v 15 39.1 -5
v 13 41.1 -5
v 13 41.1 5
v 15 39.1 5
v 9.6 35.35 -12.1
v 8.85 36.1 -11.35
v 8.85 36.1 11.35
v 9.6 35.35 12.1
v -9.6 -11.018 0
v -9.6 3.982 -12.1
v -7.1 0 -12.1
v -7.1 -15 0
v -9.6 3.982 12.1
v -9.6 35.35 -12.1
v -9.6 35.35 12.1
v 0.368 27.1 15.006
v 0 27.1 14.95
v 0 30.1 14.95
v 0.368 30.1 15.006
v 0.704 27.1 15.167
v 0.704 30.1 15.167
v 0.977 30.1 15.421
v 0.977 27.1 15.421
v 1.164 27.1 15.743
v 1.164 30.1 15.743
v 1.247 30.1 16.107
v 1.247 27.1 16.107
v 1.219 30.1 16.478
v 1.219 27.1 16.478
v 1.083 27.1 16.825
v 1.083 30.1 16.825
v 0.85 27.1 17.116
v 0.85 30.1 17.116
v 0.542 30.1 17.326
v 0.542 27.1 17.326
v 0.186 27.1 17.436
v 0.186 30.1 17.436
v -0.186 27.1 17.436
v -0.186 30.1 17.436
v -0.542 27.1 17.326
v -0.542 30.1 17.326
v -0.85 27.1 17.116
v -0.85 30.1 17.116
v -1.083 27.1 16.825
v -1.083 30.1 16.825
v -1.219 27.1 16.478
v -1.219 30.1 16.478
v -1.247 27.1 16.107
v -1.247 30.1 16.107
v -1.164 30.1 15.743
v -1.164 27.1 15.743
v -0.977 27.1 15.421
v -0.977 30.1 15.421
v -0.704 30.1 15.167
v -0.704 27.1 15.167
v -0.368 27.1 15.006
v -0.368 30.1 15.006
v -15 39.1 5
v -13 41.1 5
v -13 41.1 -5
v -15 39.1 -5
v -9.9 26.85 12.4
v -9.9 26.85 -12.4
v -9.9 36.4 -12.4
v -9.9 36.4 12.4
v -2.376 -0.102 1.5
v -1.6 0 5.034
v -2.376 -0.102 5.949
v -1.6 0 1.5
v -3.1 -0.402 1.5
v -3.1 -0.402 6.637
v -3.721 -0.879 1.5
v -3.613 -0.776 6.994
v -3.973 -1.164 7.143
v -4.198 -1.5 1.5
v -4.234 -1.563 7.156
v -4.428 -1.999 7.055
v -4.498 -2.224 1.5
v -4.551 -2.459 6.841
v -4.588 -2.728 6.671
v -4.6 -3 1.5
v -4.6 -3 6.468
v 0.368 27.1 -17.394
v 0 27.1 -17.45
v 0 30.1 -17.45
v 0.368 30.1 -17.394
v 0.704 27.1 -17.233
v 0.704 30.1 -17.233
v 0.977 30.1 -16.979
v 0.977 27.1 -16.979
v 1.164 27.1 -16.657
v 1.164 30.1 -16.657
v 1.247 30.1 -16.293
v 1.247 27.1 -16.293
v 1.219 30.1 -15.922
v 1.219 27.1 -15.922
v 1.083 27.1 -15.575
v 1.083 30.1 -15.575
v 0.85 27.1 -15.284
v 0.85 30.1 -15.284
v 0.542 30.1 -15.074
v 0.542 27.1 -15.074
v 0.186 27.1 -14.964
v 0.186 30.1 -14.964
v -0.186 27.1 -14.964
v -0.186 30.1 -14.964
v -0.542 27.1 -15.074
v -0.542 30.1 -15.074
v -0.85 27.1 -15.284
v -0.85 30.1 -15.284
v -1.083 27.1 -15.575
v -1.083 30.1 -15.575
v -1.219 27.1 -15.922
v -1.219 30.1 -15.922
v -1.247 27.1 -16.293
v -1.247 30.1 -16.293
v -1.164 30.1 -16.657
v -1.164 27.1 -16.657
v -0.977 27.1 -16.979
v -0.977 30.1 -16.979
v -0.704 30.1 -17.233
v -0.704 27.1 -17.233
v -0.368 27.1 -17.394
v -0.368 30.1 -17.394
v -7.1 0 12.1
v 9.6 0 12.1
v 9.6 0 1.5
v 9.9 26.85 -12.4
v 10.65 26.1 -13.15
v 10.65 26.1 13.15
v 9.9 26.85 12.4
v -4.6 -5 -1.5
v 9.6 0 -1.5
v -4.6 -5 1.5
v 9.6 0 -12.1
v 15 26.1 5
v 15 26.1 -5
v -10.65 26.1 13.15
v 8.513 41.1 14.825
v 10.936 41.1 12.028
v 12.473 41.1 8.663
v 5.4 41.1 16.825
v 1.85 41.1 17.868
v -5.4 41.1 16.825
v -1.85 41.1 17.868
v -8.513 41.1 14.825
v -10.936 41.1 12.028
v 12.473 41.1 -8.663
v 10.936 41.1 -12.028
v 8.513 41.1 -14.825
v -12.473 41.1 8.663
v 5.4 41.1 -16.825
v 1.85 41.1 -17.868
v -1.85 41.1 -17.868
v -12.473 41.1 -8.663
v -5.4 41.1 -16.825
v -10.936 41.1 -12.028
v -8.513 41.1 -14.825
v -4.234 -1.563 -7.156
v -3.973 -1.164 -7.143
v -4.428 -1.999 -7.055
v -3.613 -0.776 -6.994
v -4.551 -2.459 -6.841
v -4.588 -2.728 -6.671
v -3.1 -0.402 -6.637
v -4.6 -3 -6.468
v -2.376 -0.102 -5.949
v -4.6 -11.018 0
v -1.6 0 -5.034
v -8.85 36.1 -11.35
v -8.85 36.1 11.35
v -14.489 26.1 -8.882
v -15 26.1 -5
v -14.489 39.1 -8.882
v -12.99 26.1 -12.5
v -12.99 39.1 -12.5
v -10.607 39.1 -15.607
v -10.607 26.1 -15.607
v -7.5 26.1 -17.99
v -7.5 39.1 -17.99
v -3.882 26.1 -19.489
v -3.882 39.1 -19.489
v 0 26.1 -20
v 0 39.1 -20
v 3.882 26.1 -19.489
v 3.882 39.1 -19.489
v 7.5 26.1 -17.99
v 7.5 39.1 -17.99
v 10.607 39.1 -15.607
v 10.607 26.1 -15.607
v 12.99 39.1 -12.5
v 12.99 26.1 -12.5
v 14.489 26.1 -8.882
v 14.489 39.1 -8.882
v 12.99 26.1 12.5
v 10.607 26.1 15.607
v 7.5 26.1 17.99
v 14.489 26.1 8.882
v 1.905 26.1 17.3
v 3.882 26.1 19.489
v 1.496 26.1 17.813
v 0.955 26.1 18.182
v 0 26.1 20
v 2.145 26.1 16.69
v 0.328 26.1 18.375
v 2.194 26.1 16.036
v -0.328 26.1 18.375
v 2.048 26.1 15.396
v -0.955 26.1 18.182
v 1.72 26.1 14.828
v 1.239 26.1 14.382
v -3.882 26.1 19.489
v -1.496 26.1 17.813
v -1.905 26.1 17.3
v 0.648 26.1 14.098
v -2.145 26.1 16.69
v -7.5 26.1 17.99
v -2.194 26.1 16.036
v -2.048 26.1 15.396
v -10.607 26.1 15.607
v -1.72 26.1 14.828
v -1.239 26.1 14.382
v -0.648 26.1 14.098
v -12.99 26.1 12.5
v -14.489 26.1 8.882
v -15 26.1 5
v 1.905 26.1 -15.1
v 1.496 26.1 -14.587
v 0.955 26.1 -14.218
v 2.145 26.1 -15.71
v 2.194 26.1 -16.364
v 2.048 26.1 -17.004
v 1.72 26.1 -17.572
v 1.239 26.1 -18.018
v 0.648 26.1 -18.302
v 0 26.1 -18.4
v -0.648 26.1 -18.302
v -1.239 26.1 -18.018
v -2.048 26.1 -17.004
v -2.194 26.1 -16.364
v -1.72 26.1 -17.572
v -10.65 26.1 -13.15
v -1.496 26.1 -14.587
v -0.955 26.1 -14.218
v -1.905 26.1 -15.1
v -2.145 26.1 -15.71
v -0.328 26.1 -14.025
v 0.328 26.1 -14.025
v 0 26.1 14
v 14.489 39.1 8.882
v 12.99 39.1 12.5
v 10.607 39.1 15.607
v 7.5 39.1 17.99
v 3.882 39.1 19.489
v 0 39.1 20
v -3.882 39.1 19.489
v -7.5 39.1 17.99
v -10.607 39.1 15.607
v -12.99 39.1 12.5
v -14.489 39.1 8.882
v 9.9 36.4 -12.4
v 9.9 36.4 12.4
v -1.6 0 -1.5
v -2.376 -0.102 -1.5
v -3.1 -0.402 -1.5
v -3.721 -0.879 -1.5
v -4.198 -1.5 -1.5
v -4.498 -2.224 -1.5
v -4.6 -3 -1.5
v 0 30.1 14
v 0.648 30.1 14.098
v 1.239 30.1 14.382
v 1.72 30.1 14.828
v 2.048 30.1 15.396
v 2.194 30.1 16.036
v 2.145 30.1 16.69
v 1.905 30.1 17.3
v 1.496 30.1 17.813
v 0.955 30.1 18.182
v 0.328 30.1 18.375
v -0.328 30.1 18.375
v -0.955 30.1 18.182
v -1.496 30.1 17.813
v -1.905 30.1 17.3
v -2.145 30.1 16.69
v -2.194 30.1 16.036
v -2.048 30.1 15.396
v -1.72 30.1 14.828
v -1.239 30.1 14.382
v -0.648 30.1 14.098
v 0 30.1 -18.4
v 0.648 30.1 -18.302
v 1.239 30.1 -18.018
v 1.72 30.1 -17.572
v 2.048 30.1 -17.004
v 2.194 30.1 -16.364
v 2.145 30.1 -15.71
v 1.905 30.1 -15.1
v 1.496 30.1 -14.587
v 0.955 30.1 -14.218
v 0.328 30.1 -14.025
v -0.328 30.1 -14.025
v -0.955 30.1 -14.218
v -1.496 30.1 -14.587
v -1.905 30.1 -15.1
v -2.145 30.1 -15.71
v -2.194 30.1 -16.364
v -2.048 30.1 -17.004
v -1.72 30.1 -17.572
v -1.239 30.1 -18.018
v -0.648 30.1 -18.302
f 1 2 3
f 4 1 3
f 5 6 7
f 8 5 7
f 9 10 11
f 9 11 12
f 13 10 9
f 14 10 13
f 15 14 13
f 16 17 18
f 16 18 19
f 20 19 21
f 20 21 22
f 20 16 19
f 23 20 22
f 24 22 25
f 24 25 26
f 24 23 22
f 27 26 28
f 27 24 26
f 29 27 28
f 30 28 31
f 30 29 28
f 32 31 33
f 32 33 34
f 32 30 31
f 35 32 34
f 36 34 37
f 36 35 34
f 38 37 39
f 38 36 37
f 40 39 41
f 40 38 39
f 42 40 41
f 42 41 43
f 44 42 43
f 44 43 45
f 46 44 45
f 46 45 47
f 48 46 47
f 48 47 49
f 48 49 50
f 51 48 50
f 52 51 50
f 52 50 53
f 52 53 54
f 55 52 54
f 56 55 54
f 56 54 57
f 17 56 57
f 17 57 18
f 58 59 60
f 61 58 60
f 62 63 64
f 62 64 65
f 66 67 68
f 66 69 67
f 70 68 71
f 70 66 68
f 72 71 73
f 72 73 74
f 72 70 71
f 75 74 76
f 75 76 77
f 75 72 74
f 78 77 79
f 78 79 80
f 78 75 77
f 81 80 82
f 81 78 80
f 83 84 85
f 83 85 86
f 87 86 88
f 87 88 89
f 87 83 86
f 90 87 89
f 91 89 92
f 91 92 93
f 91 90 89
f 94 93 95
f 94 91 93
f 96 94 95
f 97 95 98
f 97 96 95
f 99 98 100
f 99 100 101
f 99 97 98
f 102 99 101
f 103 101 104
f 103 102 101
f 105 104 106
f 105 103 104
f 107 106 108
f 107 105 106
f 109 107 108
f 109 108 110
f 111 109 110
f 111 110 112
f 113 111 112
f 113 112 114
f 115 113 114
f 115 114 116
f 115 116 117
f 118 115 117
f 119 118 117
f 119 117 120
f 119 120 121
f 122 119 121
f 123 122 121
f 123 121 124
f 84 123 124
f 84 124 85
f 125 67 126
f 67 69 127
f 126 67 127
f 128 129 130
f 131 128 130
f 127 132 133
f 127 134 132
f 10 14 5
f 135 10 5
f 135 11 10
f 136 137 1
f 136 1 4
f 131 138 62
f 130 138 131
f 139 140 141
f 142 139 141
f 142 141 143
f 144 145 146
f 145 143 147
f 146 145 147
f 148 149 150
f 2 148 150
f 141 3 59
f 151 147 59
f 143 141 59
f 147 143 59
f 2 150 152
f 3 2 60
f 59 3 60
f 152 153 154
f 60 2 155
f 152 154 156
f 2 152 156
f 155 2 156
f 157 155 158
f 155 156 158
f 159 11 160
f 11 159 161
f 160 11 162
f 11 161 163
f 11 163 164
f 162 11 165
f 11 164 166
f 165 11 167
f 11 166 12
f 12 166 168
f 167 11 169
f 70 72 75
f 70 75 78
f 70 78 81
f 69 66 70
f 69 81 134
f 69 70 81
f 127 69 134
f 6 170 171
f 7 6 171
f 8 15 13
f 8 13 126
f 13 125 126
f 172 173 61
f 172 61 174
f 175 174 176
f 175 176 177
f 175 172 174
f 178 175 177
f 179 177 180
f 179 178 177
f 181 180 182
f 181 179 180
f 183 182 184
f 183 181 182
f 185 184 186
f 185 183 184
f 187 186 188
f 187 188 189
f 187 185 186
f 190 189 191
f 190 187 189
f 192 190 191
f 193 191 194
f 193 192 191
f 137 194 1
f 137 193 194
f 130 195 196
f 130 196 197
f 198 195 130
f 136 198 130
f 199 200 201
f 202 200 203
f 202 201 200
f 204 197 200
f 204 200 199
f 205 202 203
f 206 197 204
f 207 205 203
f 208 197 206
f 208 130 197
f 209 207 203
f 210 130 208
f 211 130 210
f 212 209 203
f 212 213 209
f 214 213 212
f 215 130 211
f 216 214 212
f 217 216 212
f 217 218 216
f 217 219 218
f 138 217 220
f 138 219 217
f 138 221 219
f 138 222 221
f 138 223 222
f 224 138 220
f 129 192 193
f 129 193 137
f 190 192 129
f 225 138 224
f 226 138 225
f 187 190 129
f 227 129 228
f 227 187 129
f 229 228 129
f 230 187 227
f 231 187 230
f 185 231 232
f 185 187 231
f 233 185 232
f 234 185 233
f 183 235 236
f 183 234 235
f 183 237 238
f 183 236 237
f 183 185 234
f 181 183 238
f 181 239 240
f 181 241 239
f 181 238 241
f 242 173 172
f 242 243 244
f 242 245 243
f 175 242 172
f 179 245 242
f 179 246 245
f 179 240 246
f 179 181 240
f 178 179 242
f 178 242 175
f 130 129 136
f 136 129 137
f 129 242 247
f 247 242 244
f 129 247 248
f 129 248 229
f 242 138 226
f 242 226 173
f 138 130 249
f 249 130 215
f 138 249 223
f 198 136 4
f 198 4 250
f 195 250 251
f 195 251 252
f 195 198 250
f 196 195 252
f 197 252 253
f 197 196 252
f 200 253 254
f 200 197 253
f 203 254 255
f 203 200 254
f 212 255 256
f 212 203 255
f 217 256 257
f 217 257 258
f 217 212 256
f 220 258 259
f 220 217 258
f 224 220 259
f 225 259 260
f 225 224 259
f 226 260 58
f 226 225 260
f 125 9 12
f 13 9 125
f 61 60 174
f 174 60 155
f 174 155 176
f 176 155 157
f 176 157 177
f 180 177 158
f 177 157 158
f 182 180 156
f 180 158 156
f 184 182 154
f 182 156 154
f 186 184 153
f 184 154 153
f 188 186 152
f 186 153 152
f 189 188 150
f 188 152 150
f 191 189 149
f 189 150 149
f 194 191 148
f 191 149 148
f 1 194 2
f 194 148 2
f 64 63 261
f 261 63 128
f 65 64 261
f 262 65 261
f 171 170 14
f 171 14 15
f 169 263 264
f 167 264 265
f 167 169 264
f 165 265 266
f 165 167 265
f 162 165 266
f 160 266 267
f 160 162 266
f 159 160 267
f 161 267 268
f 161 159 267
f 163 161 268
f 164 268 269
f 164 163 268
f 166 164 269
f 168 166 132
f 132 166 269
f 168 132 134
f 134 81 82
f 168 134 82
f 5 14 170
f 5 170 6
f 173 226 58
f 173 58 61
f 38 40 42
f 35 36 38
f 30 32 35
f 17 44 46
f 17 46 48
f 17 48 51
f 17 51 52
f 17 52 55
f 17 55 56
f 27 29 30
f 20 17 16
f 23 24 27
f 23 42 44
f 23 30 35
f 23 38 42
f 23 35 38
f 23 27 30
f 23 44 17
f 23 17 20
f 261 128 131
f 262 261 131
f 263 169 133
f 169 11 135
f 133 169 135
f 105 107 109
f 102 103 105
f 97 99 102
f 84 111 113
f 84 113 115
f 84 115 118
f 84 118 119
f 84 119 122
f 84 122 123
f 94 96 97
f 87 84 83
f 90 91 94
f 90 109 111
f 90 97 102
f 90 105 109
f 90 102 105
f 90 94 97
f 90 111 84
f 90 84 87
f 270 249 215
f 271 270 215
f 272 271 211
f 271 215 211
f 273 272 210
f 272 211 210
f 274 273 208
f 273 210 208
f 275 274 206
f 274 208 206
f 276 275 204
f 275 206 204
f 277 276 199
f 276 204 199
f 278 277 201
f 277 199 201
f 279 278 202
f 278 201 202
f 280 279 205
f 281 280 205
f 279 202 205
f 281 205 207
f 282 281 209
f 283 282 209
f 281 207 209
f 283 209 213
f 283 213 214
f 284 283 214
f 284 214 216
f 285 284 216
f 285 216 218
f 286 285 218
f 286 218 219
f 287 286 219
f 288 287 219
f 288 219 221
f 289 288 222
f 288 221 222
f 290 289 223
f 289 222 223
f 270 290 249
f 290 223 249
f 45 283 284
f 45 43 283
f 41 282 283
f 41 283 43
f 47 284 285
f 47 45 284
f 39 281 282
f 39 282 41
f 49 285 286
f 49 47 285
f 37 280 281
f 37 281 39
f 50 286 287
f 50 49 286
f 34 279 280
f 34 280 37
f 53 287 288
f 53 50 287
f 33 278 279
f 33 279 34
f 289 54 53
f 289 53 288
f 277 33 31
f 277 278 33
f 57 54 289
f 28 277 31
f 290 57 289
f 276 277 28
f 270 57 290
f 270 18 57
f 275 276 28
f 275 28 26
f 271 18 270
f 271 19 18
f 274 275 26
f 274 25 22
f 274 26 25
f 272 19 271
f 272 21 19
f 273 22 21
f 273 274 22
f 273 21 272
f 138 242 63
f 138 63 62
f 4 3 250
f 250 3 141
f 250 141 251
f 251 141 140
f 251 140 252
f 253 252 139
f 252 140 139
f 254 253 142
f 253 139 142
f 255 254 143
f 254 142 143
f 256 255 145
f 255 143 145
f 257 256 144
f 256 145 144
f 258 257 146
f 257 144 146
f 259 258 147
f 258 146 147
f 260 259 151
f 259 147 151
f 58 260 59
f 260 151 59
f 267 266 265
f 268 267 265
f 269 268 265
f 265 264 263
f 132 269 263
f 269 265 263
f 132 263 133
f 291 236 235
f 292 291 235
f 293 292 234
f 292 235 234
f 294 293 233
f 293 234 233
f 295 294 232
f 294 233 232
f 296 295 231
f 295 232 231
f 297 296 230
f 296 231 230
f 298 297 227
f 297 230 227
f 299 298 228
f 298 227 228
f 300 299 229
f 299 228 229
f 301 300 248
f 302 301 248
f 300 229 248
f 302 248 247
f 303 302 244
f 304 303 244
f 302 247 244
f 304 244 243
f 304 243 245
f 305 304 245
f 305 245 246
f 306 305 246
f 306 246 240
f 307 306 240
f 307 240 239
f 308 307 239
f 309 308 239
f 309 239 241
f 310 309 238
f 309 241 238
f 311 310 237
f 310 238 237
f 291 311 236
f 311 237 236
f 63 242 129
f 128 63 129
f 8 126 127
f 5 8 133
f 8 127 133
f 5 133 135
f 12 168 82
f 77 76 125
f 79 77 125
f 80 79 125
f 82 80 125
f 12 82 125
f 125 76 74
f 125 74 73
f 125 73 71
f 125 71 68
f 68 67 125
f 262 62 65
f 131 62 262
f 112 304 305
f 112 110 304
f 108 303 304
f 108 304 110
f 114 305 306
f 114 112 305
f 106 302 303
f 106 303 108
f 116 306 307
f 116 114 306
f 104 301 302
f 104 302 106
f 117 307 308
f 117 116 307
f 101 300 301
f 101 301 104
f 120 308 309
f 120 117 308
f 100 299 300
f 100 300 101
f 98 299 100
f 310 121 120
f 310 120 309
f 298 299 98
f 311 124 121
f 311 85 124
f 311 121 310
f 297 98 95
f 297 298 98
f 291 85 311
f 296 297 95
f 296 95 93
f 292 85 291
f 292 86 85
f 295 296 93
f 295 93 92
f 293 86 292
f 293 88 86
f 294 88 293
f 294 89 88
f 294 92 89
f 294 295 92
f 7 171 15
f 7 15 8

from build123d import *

# Parameters (mm, degrees)
SKETCH1_W               = 19.2
SKETCH1_H               = 24.2
BOSS_EXTRUDE1_DEPTH     = 26.1
BOSS_EXTRUDE2_DEPTH     = 15
BOSS_EXTRUDE3_DEPTH     = 5
BOSS_EXTRUDE4_DEPTH     = 1.5
CHAMFER1_SIZE           = 2.5
FILLET1_R               = 3
SKETCH9_W               = 19.8
SKETCH9_H               = 24.8
SKETCH9_W_2             = 19.2
SKETCH9_H_2             = 24.2
CUT_EXTRUDE_THIN1_DEPTH = 10
SKETCH10_W              = 24.8
SKETCH10_H              = 0.3
CUT_EXTRUDE1_DEPTH      = 19.2
SKETCH12_W              = 19.8
SKETCH12_H              = 24.8
CUT_EXTRUDE3_DEPTH      = 0.3
CHAMFER2_SIZE           = 0.75
CHAMFER3_SIZE           = 0.75
SKETCH14_R              = 2.2
SKETCH14_R_2            = 1.25
CUT_EXTRUDE4_DEPTH      = 4
CHAMFER6_SIZE           = 2
SKETCH16_R              = 1.25
CUT_EXTRUDE6_DEPTH      = 1


with BuildPart() as part:
    # Sketch1 → Boss-Extrude1 (new body)
    with BuildSketch(Plane(origin=(0, 0, 0), x_dir=(1, 0, 0), z_dir=(0, 1, 0))):
        Rectangle(SKETCH1_W, SKETCH1_H)
    extrude(amount=BOSS_EXTRUDE1_DEPTH)

    # Sketch2 → Boss-Extrude2 (add)
    with BuildSketch(Plane(origin=(0, 26.1, 0), x_dir=(1, 0, 0), z_dir=(0, 1, 0))):
        with BuildLine():
            Line((15, 5), (15, -5))
            ThreePointArc((15, -5), (0, -20), (-15, -5))
            Line((-15, -5), (-15, 5))
            ThreePointArc((-15, 5), (0, 20), (15, 5))
        make_face()
    extrude(amount=BOSS_EXTRUDE2_DEPTH)

    # Sketch4 → Boss-Extrude3 (add)
    with BuildSketch(Plane.ZY.offset(9.6)):
        Polygon((-12.1, 0), (0, -15), (12.1, 0), align=None)
    extrude(amount=-BOSS_EXTRUDE3_DEPTH)

    # Sketch6 → Boss-Extrude4 (add, symmetric)
    with BuildSketch(Plane.XY):
        Polygon((-4.6, -5), (9.6, 0), (-4.6, 0), align=None)
    extrude(amount=BOSS_EXTRUDE4_DEPTH, both=True)

    # Chamfer1
    chamfer1_edges = [part.edges().sort_by_distance(p)[0] for p in [
        (-9.6, -7.5, -6.05),
        (-4.6, -7.5, -6.05),
        (-9.6, -7.5, 6.05),
        (-4.6, -7.5, 6.05),
    ]]
    chamfer(chamfer1_edges, length=CHAMFER1_SIZE - 0.0001)  # a hair under: the kernel refuses the full size

    # Fillet1
    fillet1_edges = [part.edges().sort_by_distance(p)[0] for p in [
        (-4.6, 0, -5.194064205),
        (-4.6, 0, 5.194064205),
    ]]
    fillet(fillet1_edges, radius=FILLET1_R)

    # Sketch9 → Cut-Extrude-Thin1 (cut)
    with BuildSketch(Plane.XZ.offset(-26.1)):
        Rectangle(SKETCH9_W, SKETCH9_H)
        Rectangle(SKETCH9_W_2, SKETCH9_H_2, mode=Mode.SUBTRACT)
    extrude(amount=-CUT_EXTRUDE_THIN1_DEPTH, mode=Mode.SUBTRACT)

    # Sketch10 → Cut-Extrude1 (cut)
    with BuildSketch(Plane.ZY.offset(9.6)):
        with Locations((0, 36.25)):
            Rectangle(SKETCH10_W, SKETCH10_H)
    extrude(amount=-CUT_EXTRUDE1_DEPTH, mode=Mode.SUBTRACT)


with BuildPart() as cut_extrude1_piece_1:
    # of the separate pieces the step leaves, piece 1, a body of its own (cut_extrude1_pieces)
    add(part.part.solids().sort_by_distance((-1.6, 0, 1.5))[0])

    # Chamfer3
    chamfer3_edges = [cut_extrude1_piece_1.edges().sort_by_distance(p)[0] for p in [
        (0, 36.1, -12.1),
        (9.6, 36.1, 0),
        (0, 36.1, 12.1),
        (-9.6, 36.1, 0),
    ]]
    chamfer(chamfer3_edges, length=CHAMFER3_SIZE)


with BuildPart() as cut_extrude1_piece_2:
    # of the separate pieces the step leaves, piece 2, a body of its own (cut_extrude1_pieces)
    add(part.part.solids().sort_by_distance((9.9, 36.1, 12.4))[0])

    # Sketch12 → Cut-Extrude3 (cut)
    with BuildSketch(Plane.XZ.offset(-36.1)):
        Rectangle(SKETCH12_W, SKETCH12_H)
    extrude(amount=-CUT_EXTRUDE3_DEPTH, mode=Mode.SUBTRACT)

    # Chamfer2
    chamfer2_edges = [cut_extrude1_piece_2.edges().sort_by_distance(p)[0] for p in [
        (9.9, 26.1, 0),
        (0, 26.1, -12.4),
        (-9.9, 26.1, 0),
        (0, 26.1, 12.4),
    ]]
    chamfer(chamfer2_edges, length=CHAMFER2_SIZE)

    # Sketch14 → Cut-Extrude4 (cut)
    # profile 1 of 2: a face of its own
    with BuildSketch(Plane.XZ.offset(-26.1)):
        with Locations(Location((0, -16.2, 0), (0, 0, 270))):
            Circle(SKETCH14_R)
        with Locations(Location((0, -16.2, 0), (0, 0, 270))):
            Circle(SKETCH14_R_2, mode=Mode.SUBTRACT)
    # profile 2 of 2: a face of its own
    with BuildSketch(Plane.XZ.offset(-26.1)):
        with Locations(Location((0, 16.2, 0), (0, 0, 270))):
            Circle(SKETCH14_R)
        with Locations(Location((0, 16.2, 0), (0, 0, 270))):
            Circle(SKETCH14_R_2, mode=Mode.SUBTRACT)
    extrude(amount=-CUT_EXTRUDE4_DEPTH, mode=Mode.SUBTRACT)

    # Chamfer6
    chamfer6_edges = [cut_extrude1_piece_2.edges().sort_by_distance(p)[0] for p in [
        (0, 41.1, -20),
        (-15, 41.1, 0),
        (0, 41.1, 20),
        (15, 41.1, 0),
    ]]
    chamfer(chamfer6_edges, length=CHAMFER6_SIZE)

    # Sketch16 → Cut-Extrude6 (cut)
    with BuildSketch(Plane.XZ.offset(-26.1)):
        with Locations(Location((0, 16.2, 0), (0, 0, 270))):
            Circle(SKETCH16_R)
        with Locations(Location((0, -16.2, 0), (0, 0, 270))):
            Circle(SKETCH16_R)
    extrude(amount=-CUT_EXTRUDE6_DEPTH, mode=Mode.SUBTRACT)


solid = Compound([cut_extrude1_piece_1.part, cut_extrude1_piece_2.part])
